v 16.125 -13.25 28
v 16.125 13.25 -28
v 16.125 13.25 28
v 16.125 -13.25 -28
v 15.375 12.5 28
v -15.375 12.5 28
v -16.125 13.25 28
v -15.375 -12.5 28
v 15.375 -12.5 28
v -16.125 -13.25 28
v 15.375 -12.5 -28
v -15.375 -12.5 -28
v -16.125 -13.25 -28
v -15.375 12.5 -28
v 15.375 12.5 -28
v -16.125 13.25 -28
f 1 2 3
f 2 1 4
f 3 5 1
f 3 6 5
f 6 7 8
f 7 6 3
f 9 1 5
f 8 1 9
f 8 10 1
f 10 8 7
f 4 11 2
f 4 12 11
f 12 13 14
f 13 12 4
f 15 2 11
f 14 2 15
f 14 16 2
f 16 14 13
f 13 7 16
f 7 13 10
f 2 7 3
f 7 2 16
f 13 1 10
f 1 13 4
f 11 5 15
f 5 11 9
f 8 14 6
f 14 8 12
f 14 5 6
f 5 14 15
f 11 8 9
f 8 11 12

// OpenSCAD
x = 30.75;
y = 25;
z = 56;
t = 1.5;

difference(){
    cube([x+t, y+t, z], center=true);
    cube([x, y, z], center=true);
}
